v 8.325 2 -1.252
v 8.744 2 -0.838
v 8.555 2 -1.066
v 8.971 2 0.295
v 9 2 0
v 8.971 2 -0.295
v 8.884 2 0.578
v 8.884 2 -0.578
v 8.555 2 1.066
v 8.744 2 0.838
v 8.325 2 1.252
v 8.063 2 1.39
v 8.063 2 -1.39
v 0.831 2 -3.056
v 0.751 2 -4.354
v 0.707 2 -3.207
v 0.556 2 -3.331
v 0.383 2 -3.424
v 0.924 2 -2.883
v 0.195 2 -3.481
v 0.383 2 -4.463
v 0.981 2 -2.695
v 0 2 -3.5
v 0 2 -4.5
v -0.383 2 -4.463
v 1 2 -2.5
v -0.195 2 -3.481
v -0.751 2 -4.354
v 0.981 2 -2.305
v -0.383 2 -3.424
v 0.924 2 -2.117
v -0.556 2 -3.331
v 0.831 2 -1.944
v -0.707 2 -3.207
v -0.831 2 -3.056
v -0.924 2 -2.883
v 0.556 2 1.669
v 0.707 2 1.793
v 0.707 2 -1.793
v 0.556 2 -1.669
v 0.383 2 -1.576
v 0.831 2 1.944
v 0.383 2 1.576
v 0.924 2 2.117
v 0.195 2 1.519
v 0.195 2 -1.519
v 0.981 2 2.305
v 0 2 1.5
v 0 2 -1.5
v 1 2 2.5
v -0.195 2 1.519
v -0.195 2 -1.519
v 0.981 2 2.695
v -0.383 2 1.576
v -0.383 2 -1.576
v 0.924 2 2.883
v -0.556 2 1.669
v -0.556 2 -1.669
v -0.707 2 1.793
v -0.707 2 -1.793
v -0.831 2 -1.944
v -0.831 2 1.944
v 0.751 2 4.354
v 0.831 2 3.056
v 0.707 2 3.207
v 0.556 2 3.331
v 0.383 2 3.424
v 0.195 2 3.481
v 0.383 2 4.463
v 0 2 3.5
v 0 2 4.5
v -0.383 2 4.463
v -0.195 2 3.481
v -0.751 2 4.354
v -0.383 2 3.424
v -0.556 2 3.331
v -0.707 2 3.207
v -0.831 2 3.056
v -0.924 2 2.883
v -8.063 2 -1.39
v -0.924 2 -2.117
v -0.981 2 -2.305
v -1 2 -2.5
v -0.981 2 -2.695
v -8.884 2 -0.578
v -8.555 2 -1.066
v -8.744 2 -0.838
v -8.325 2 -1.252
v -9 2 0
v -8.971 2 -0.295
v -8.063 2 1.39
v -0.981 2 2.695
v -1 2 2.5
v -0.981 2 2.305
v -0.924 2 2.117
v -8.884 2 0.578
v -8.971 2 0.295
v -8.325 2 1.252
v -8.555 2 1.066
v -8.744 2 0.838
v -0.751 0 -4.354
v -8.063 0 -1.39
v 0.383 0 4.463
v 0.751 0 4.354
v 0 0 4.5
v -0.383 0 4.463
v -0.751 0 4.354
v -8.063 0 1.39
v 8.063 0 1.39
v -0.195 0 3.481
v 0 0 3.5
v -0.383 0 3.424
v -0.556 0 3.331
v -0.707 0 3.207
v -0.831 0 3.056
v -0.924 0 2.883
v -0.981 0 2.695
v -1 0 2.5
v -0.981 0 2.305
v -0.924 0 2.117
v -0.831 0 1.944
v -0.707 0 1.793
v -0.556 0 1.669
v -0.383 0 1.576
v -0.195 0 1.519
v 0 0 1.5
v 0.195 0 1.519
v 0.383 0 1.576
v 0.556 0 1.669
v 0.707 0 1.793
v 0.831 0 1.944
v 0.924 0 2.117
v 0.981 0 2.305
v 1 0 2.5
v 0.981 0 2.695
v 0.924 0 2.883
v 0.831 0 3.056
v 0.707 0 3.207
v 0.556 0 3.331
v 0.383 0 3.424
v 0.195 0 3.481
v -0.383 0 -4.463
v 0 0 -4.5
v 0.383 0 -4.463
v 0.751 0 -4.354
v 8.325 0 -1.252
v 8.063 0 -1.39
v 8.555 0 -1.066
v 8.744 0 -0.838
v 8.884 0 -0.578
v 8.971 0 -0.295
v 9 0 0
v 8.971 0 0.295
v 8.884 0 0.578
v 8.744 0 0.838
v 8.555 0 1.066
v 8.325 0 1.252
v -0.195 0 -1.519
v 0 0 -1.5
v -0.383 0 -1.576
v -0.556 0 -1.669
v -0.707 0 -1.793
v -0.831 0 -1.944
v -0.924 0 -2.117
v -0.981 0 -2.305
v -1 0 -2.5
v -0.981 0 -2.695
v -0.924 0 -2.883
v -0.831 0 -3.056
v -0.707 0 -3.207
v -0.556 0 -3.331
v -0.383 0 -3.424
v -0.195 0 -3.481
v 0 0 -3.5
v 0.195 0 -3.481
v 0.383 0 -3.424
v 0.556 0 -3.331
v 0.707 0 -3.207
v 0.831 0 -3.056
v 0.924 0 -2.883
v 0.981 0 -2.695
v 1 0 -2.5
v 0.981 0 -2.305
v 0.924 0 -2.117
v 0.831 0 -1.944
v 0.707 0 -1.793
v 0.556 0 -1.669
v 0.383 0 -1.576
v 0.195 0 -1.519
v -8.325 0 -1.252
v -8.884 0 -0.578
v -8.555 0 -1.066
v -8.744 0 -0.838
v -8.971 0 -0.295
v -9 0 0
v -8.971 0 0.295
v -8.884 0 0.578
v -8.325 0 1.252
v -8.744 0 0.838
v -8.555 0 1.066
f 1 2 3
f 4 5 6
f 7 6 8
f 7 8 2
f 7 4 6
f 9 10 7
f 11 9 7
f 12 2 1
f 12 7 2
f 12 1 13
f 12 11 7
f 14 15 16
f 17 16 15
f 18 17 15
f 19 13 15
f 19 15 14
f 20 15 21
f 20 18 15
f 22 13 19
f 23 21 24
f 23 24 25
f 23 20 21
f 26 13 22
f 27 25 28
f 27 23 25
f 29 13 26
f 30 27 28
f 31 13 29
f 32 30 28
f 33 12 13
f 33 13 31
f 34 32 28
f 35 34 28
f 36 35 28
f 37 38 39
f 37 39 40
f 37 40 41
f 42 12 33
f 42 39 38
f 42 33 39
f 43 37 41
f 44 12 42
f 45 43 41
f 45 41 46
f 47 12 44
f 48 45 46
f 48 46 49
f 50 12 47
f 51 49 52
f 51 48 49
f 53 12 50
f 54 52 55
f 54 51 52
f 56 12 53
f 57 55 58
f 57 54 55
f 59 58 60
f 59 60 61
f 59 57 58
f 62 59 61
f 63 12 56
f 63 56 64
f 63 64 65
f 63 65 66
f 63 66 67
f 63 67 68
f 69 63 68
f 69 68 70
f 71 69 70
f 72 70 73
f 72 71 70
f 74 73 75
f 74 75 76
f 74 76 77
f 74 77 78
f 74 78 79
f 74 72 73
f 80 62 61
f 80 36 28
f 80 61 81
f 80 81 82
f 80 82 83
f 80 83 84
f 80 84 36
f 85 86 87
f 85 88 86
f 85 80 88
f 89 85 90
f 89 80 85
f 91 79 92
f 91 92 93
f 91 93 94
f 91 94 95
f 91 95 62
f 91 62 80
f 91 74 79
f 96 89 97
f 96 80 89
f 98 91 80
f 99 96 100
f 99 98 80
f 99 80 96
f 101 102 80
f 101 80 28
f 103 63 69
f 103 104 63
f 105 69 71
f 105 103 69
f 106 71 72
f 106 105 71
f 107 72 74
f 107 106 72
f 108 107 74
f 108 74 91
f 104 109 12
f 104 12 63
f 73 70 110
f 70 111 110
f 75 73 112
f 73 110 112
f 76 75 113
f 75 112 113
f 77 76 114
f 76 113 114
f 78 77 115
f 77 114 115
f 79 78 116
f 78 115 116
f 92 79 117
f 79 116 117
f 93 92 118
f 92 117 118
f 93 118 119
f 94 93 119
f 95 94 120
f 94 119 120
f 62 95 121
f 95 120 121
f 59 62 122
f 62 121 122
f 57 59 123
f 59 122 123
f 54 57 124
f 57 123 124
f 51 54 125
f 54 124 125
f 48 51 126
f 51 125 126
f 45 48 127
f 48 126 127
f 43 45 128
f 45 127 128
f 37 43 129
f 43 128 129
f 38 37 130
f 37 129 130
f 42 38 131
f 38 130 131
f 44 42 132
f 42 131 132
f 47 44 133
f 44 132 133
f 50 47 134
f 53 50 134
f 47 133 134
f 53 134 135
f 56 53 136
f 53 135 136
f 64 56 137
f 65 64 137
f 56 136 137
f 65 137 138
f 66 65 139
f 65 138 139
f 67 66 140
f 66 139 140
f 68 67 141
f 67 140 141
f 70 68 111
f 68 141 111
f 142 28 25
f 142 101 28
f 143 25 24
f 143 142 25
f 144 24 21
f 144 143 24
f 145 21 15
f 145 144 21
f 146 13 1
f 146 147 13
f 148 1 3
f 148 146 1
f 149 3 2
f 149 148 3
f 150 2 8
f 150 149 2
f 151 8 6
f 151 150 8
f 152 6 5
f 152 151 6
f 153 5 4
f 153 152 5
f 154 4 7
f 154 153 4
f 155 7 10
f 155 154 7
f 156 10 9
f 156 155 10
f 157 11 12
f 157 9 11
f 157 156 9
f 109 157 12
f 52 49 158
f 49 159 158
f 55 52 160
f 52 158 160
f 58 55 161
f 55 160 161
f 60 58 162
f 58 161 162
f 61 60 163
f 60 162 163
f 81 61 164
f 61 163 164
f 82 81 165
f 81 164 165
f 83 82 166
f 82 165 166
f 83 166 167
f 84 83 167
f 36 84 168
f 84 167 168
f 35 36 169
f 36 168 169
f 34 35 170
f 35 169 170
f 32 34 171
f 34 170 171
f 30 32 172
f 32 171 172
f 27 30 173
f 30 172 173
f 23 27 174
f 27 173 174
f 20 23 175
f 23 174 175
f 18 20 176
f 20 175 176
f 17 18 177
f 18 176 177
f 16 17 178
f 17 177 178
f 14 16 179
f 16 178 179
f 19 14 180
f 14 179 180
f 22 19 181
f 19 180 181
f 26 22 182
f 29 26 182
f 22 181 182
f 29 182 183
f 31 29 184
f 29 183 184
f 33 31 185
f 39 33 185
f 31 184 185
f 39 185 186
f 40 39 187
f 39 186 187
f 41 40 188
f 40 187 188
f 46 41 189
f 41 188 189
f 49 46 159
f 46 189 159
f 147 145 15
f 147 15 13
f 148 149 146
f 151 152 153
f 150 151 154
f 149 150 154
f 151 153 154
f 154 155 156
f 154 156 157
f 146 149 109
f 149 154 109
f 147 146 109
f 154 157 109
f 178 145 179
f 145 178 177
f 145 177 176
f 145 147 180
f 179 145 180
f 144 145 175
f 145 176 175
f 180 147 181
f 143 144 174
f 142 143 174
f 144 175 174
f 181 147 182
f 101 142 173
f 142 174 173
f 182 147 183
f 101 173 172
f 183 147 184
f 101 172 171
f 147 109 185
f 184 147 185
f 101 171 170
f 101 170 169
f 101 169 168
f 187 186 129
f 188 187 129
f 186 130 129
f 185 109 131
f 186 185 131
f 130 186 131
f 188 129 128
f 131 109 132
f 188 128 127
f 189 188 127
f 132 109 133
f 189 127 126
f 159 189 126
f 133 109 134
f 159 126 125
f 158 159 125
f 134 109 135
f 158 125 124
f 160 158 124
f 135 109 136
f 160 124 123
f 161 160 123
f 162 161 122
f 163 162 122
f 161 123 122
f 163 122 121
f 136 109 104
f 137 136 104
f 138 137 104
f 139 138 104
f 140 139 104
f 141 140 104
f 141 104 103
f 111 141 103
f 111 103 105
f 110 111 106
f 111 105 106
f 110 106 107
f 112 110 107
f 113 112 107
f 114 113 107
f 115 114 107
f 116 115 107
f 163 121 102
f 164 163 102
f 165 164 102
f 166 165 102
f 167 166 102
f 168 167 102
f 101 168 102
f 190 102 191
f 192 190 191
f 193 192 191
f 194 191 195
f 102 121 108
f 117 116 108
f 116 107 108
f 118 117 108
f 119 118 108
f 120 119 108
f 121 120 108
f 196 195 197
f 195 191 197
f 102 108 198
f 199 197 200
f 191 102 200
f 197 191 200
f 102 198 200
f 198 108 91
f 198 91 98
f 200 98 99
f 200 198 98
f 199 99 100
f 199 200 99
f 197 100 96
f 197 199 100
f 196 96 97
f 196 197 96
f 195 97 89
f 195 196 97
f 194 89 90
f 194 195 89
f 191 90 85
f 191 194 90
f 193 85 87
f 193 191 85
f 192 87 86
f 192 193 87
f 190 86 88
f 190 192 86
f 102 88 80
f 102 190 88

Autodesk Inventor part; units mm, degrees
ref_plane "YZ Plane" through (0, 0, 0) normal (1, 0, 0) x (0, 1, 0)
ref_plane "XZ Plane" through (0, 0, 0) normal (0, 1, 0) x (-1, 0, 0)
ref_plane "XY Plane" through (0, 0, 0) normal (0, 0, 1) x (1, 0, 0)
sketch "スケッチ1" plane through (0, 0, 0) normal (0, 1, 0) x (-1, 0, 0)
  circle A0 centre (7.5, 0) radius 1.5
  circle A1 centre (0, 2.5) radius 2
  circle A2 centre (0, -2.5) radius 2
  circle A3 centre (-7.5, 0) radius 1.5
  line L0 (7.5, 0) -> (-7.5, 0) construction
  line L1 (0, -2.5) -> (0, 2.5) construction
  line L2 (0.7512, 4.3536) -> (8.0634, 1.3902)
  line L3 (8.0634, -1.3902) -> (0.7512, -4.3536)
  line L4 (-0.7512, -4.3536) -> (-8.0634, -1.3902)
  line L5 (-8.0634, 1.3902) -> (-0.7512, 4.3536)
  point P0 (0, 0)
  point P1 (0, 0)
  dimension "d0" = 5
  dimension "d1" = 15
  dimension "d2" = 4
  dimension "d3" = 3
extrude "押し出し1" add sketch "スケッチ1" along normal blind 2
sketch "スケッチ2" plane through (0, 2, 0) normal (0, 1, 0) x (1, 0, 0)
  arc A0 (-0.7512, -4.3536) -> (0.7512, -4.3536) centre (0, -2.5) ccw projected
  arc A1 (0.7512, 4.3536) -> (-0.7512, 4.3536) centre (0, 2.5) ccw projected
  point P0 (0, 0)
hole "穴1" at (0, 2, 2.5) at (0, 2, -2.5) direction (0, -1, 0) diameter 2 end through all clearance for "Flat Head Machine Screw (82)" size "#0" standard "Ansi Unified Screw Threads"
properties part number "Band_Cap"
